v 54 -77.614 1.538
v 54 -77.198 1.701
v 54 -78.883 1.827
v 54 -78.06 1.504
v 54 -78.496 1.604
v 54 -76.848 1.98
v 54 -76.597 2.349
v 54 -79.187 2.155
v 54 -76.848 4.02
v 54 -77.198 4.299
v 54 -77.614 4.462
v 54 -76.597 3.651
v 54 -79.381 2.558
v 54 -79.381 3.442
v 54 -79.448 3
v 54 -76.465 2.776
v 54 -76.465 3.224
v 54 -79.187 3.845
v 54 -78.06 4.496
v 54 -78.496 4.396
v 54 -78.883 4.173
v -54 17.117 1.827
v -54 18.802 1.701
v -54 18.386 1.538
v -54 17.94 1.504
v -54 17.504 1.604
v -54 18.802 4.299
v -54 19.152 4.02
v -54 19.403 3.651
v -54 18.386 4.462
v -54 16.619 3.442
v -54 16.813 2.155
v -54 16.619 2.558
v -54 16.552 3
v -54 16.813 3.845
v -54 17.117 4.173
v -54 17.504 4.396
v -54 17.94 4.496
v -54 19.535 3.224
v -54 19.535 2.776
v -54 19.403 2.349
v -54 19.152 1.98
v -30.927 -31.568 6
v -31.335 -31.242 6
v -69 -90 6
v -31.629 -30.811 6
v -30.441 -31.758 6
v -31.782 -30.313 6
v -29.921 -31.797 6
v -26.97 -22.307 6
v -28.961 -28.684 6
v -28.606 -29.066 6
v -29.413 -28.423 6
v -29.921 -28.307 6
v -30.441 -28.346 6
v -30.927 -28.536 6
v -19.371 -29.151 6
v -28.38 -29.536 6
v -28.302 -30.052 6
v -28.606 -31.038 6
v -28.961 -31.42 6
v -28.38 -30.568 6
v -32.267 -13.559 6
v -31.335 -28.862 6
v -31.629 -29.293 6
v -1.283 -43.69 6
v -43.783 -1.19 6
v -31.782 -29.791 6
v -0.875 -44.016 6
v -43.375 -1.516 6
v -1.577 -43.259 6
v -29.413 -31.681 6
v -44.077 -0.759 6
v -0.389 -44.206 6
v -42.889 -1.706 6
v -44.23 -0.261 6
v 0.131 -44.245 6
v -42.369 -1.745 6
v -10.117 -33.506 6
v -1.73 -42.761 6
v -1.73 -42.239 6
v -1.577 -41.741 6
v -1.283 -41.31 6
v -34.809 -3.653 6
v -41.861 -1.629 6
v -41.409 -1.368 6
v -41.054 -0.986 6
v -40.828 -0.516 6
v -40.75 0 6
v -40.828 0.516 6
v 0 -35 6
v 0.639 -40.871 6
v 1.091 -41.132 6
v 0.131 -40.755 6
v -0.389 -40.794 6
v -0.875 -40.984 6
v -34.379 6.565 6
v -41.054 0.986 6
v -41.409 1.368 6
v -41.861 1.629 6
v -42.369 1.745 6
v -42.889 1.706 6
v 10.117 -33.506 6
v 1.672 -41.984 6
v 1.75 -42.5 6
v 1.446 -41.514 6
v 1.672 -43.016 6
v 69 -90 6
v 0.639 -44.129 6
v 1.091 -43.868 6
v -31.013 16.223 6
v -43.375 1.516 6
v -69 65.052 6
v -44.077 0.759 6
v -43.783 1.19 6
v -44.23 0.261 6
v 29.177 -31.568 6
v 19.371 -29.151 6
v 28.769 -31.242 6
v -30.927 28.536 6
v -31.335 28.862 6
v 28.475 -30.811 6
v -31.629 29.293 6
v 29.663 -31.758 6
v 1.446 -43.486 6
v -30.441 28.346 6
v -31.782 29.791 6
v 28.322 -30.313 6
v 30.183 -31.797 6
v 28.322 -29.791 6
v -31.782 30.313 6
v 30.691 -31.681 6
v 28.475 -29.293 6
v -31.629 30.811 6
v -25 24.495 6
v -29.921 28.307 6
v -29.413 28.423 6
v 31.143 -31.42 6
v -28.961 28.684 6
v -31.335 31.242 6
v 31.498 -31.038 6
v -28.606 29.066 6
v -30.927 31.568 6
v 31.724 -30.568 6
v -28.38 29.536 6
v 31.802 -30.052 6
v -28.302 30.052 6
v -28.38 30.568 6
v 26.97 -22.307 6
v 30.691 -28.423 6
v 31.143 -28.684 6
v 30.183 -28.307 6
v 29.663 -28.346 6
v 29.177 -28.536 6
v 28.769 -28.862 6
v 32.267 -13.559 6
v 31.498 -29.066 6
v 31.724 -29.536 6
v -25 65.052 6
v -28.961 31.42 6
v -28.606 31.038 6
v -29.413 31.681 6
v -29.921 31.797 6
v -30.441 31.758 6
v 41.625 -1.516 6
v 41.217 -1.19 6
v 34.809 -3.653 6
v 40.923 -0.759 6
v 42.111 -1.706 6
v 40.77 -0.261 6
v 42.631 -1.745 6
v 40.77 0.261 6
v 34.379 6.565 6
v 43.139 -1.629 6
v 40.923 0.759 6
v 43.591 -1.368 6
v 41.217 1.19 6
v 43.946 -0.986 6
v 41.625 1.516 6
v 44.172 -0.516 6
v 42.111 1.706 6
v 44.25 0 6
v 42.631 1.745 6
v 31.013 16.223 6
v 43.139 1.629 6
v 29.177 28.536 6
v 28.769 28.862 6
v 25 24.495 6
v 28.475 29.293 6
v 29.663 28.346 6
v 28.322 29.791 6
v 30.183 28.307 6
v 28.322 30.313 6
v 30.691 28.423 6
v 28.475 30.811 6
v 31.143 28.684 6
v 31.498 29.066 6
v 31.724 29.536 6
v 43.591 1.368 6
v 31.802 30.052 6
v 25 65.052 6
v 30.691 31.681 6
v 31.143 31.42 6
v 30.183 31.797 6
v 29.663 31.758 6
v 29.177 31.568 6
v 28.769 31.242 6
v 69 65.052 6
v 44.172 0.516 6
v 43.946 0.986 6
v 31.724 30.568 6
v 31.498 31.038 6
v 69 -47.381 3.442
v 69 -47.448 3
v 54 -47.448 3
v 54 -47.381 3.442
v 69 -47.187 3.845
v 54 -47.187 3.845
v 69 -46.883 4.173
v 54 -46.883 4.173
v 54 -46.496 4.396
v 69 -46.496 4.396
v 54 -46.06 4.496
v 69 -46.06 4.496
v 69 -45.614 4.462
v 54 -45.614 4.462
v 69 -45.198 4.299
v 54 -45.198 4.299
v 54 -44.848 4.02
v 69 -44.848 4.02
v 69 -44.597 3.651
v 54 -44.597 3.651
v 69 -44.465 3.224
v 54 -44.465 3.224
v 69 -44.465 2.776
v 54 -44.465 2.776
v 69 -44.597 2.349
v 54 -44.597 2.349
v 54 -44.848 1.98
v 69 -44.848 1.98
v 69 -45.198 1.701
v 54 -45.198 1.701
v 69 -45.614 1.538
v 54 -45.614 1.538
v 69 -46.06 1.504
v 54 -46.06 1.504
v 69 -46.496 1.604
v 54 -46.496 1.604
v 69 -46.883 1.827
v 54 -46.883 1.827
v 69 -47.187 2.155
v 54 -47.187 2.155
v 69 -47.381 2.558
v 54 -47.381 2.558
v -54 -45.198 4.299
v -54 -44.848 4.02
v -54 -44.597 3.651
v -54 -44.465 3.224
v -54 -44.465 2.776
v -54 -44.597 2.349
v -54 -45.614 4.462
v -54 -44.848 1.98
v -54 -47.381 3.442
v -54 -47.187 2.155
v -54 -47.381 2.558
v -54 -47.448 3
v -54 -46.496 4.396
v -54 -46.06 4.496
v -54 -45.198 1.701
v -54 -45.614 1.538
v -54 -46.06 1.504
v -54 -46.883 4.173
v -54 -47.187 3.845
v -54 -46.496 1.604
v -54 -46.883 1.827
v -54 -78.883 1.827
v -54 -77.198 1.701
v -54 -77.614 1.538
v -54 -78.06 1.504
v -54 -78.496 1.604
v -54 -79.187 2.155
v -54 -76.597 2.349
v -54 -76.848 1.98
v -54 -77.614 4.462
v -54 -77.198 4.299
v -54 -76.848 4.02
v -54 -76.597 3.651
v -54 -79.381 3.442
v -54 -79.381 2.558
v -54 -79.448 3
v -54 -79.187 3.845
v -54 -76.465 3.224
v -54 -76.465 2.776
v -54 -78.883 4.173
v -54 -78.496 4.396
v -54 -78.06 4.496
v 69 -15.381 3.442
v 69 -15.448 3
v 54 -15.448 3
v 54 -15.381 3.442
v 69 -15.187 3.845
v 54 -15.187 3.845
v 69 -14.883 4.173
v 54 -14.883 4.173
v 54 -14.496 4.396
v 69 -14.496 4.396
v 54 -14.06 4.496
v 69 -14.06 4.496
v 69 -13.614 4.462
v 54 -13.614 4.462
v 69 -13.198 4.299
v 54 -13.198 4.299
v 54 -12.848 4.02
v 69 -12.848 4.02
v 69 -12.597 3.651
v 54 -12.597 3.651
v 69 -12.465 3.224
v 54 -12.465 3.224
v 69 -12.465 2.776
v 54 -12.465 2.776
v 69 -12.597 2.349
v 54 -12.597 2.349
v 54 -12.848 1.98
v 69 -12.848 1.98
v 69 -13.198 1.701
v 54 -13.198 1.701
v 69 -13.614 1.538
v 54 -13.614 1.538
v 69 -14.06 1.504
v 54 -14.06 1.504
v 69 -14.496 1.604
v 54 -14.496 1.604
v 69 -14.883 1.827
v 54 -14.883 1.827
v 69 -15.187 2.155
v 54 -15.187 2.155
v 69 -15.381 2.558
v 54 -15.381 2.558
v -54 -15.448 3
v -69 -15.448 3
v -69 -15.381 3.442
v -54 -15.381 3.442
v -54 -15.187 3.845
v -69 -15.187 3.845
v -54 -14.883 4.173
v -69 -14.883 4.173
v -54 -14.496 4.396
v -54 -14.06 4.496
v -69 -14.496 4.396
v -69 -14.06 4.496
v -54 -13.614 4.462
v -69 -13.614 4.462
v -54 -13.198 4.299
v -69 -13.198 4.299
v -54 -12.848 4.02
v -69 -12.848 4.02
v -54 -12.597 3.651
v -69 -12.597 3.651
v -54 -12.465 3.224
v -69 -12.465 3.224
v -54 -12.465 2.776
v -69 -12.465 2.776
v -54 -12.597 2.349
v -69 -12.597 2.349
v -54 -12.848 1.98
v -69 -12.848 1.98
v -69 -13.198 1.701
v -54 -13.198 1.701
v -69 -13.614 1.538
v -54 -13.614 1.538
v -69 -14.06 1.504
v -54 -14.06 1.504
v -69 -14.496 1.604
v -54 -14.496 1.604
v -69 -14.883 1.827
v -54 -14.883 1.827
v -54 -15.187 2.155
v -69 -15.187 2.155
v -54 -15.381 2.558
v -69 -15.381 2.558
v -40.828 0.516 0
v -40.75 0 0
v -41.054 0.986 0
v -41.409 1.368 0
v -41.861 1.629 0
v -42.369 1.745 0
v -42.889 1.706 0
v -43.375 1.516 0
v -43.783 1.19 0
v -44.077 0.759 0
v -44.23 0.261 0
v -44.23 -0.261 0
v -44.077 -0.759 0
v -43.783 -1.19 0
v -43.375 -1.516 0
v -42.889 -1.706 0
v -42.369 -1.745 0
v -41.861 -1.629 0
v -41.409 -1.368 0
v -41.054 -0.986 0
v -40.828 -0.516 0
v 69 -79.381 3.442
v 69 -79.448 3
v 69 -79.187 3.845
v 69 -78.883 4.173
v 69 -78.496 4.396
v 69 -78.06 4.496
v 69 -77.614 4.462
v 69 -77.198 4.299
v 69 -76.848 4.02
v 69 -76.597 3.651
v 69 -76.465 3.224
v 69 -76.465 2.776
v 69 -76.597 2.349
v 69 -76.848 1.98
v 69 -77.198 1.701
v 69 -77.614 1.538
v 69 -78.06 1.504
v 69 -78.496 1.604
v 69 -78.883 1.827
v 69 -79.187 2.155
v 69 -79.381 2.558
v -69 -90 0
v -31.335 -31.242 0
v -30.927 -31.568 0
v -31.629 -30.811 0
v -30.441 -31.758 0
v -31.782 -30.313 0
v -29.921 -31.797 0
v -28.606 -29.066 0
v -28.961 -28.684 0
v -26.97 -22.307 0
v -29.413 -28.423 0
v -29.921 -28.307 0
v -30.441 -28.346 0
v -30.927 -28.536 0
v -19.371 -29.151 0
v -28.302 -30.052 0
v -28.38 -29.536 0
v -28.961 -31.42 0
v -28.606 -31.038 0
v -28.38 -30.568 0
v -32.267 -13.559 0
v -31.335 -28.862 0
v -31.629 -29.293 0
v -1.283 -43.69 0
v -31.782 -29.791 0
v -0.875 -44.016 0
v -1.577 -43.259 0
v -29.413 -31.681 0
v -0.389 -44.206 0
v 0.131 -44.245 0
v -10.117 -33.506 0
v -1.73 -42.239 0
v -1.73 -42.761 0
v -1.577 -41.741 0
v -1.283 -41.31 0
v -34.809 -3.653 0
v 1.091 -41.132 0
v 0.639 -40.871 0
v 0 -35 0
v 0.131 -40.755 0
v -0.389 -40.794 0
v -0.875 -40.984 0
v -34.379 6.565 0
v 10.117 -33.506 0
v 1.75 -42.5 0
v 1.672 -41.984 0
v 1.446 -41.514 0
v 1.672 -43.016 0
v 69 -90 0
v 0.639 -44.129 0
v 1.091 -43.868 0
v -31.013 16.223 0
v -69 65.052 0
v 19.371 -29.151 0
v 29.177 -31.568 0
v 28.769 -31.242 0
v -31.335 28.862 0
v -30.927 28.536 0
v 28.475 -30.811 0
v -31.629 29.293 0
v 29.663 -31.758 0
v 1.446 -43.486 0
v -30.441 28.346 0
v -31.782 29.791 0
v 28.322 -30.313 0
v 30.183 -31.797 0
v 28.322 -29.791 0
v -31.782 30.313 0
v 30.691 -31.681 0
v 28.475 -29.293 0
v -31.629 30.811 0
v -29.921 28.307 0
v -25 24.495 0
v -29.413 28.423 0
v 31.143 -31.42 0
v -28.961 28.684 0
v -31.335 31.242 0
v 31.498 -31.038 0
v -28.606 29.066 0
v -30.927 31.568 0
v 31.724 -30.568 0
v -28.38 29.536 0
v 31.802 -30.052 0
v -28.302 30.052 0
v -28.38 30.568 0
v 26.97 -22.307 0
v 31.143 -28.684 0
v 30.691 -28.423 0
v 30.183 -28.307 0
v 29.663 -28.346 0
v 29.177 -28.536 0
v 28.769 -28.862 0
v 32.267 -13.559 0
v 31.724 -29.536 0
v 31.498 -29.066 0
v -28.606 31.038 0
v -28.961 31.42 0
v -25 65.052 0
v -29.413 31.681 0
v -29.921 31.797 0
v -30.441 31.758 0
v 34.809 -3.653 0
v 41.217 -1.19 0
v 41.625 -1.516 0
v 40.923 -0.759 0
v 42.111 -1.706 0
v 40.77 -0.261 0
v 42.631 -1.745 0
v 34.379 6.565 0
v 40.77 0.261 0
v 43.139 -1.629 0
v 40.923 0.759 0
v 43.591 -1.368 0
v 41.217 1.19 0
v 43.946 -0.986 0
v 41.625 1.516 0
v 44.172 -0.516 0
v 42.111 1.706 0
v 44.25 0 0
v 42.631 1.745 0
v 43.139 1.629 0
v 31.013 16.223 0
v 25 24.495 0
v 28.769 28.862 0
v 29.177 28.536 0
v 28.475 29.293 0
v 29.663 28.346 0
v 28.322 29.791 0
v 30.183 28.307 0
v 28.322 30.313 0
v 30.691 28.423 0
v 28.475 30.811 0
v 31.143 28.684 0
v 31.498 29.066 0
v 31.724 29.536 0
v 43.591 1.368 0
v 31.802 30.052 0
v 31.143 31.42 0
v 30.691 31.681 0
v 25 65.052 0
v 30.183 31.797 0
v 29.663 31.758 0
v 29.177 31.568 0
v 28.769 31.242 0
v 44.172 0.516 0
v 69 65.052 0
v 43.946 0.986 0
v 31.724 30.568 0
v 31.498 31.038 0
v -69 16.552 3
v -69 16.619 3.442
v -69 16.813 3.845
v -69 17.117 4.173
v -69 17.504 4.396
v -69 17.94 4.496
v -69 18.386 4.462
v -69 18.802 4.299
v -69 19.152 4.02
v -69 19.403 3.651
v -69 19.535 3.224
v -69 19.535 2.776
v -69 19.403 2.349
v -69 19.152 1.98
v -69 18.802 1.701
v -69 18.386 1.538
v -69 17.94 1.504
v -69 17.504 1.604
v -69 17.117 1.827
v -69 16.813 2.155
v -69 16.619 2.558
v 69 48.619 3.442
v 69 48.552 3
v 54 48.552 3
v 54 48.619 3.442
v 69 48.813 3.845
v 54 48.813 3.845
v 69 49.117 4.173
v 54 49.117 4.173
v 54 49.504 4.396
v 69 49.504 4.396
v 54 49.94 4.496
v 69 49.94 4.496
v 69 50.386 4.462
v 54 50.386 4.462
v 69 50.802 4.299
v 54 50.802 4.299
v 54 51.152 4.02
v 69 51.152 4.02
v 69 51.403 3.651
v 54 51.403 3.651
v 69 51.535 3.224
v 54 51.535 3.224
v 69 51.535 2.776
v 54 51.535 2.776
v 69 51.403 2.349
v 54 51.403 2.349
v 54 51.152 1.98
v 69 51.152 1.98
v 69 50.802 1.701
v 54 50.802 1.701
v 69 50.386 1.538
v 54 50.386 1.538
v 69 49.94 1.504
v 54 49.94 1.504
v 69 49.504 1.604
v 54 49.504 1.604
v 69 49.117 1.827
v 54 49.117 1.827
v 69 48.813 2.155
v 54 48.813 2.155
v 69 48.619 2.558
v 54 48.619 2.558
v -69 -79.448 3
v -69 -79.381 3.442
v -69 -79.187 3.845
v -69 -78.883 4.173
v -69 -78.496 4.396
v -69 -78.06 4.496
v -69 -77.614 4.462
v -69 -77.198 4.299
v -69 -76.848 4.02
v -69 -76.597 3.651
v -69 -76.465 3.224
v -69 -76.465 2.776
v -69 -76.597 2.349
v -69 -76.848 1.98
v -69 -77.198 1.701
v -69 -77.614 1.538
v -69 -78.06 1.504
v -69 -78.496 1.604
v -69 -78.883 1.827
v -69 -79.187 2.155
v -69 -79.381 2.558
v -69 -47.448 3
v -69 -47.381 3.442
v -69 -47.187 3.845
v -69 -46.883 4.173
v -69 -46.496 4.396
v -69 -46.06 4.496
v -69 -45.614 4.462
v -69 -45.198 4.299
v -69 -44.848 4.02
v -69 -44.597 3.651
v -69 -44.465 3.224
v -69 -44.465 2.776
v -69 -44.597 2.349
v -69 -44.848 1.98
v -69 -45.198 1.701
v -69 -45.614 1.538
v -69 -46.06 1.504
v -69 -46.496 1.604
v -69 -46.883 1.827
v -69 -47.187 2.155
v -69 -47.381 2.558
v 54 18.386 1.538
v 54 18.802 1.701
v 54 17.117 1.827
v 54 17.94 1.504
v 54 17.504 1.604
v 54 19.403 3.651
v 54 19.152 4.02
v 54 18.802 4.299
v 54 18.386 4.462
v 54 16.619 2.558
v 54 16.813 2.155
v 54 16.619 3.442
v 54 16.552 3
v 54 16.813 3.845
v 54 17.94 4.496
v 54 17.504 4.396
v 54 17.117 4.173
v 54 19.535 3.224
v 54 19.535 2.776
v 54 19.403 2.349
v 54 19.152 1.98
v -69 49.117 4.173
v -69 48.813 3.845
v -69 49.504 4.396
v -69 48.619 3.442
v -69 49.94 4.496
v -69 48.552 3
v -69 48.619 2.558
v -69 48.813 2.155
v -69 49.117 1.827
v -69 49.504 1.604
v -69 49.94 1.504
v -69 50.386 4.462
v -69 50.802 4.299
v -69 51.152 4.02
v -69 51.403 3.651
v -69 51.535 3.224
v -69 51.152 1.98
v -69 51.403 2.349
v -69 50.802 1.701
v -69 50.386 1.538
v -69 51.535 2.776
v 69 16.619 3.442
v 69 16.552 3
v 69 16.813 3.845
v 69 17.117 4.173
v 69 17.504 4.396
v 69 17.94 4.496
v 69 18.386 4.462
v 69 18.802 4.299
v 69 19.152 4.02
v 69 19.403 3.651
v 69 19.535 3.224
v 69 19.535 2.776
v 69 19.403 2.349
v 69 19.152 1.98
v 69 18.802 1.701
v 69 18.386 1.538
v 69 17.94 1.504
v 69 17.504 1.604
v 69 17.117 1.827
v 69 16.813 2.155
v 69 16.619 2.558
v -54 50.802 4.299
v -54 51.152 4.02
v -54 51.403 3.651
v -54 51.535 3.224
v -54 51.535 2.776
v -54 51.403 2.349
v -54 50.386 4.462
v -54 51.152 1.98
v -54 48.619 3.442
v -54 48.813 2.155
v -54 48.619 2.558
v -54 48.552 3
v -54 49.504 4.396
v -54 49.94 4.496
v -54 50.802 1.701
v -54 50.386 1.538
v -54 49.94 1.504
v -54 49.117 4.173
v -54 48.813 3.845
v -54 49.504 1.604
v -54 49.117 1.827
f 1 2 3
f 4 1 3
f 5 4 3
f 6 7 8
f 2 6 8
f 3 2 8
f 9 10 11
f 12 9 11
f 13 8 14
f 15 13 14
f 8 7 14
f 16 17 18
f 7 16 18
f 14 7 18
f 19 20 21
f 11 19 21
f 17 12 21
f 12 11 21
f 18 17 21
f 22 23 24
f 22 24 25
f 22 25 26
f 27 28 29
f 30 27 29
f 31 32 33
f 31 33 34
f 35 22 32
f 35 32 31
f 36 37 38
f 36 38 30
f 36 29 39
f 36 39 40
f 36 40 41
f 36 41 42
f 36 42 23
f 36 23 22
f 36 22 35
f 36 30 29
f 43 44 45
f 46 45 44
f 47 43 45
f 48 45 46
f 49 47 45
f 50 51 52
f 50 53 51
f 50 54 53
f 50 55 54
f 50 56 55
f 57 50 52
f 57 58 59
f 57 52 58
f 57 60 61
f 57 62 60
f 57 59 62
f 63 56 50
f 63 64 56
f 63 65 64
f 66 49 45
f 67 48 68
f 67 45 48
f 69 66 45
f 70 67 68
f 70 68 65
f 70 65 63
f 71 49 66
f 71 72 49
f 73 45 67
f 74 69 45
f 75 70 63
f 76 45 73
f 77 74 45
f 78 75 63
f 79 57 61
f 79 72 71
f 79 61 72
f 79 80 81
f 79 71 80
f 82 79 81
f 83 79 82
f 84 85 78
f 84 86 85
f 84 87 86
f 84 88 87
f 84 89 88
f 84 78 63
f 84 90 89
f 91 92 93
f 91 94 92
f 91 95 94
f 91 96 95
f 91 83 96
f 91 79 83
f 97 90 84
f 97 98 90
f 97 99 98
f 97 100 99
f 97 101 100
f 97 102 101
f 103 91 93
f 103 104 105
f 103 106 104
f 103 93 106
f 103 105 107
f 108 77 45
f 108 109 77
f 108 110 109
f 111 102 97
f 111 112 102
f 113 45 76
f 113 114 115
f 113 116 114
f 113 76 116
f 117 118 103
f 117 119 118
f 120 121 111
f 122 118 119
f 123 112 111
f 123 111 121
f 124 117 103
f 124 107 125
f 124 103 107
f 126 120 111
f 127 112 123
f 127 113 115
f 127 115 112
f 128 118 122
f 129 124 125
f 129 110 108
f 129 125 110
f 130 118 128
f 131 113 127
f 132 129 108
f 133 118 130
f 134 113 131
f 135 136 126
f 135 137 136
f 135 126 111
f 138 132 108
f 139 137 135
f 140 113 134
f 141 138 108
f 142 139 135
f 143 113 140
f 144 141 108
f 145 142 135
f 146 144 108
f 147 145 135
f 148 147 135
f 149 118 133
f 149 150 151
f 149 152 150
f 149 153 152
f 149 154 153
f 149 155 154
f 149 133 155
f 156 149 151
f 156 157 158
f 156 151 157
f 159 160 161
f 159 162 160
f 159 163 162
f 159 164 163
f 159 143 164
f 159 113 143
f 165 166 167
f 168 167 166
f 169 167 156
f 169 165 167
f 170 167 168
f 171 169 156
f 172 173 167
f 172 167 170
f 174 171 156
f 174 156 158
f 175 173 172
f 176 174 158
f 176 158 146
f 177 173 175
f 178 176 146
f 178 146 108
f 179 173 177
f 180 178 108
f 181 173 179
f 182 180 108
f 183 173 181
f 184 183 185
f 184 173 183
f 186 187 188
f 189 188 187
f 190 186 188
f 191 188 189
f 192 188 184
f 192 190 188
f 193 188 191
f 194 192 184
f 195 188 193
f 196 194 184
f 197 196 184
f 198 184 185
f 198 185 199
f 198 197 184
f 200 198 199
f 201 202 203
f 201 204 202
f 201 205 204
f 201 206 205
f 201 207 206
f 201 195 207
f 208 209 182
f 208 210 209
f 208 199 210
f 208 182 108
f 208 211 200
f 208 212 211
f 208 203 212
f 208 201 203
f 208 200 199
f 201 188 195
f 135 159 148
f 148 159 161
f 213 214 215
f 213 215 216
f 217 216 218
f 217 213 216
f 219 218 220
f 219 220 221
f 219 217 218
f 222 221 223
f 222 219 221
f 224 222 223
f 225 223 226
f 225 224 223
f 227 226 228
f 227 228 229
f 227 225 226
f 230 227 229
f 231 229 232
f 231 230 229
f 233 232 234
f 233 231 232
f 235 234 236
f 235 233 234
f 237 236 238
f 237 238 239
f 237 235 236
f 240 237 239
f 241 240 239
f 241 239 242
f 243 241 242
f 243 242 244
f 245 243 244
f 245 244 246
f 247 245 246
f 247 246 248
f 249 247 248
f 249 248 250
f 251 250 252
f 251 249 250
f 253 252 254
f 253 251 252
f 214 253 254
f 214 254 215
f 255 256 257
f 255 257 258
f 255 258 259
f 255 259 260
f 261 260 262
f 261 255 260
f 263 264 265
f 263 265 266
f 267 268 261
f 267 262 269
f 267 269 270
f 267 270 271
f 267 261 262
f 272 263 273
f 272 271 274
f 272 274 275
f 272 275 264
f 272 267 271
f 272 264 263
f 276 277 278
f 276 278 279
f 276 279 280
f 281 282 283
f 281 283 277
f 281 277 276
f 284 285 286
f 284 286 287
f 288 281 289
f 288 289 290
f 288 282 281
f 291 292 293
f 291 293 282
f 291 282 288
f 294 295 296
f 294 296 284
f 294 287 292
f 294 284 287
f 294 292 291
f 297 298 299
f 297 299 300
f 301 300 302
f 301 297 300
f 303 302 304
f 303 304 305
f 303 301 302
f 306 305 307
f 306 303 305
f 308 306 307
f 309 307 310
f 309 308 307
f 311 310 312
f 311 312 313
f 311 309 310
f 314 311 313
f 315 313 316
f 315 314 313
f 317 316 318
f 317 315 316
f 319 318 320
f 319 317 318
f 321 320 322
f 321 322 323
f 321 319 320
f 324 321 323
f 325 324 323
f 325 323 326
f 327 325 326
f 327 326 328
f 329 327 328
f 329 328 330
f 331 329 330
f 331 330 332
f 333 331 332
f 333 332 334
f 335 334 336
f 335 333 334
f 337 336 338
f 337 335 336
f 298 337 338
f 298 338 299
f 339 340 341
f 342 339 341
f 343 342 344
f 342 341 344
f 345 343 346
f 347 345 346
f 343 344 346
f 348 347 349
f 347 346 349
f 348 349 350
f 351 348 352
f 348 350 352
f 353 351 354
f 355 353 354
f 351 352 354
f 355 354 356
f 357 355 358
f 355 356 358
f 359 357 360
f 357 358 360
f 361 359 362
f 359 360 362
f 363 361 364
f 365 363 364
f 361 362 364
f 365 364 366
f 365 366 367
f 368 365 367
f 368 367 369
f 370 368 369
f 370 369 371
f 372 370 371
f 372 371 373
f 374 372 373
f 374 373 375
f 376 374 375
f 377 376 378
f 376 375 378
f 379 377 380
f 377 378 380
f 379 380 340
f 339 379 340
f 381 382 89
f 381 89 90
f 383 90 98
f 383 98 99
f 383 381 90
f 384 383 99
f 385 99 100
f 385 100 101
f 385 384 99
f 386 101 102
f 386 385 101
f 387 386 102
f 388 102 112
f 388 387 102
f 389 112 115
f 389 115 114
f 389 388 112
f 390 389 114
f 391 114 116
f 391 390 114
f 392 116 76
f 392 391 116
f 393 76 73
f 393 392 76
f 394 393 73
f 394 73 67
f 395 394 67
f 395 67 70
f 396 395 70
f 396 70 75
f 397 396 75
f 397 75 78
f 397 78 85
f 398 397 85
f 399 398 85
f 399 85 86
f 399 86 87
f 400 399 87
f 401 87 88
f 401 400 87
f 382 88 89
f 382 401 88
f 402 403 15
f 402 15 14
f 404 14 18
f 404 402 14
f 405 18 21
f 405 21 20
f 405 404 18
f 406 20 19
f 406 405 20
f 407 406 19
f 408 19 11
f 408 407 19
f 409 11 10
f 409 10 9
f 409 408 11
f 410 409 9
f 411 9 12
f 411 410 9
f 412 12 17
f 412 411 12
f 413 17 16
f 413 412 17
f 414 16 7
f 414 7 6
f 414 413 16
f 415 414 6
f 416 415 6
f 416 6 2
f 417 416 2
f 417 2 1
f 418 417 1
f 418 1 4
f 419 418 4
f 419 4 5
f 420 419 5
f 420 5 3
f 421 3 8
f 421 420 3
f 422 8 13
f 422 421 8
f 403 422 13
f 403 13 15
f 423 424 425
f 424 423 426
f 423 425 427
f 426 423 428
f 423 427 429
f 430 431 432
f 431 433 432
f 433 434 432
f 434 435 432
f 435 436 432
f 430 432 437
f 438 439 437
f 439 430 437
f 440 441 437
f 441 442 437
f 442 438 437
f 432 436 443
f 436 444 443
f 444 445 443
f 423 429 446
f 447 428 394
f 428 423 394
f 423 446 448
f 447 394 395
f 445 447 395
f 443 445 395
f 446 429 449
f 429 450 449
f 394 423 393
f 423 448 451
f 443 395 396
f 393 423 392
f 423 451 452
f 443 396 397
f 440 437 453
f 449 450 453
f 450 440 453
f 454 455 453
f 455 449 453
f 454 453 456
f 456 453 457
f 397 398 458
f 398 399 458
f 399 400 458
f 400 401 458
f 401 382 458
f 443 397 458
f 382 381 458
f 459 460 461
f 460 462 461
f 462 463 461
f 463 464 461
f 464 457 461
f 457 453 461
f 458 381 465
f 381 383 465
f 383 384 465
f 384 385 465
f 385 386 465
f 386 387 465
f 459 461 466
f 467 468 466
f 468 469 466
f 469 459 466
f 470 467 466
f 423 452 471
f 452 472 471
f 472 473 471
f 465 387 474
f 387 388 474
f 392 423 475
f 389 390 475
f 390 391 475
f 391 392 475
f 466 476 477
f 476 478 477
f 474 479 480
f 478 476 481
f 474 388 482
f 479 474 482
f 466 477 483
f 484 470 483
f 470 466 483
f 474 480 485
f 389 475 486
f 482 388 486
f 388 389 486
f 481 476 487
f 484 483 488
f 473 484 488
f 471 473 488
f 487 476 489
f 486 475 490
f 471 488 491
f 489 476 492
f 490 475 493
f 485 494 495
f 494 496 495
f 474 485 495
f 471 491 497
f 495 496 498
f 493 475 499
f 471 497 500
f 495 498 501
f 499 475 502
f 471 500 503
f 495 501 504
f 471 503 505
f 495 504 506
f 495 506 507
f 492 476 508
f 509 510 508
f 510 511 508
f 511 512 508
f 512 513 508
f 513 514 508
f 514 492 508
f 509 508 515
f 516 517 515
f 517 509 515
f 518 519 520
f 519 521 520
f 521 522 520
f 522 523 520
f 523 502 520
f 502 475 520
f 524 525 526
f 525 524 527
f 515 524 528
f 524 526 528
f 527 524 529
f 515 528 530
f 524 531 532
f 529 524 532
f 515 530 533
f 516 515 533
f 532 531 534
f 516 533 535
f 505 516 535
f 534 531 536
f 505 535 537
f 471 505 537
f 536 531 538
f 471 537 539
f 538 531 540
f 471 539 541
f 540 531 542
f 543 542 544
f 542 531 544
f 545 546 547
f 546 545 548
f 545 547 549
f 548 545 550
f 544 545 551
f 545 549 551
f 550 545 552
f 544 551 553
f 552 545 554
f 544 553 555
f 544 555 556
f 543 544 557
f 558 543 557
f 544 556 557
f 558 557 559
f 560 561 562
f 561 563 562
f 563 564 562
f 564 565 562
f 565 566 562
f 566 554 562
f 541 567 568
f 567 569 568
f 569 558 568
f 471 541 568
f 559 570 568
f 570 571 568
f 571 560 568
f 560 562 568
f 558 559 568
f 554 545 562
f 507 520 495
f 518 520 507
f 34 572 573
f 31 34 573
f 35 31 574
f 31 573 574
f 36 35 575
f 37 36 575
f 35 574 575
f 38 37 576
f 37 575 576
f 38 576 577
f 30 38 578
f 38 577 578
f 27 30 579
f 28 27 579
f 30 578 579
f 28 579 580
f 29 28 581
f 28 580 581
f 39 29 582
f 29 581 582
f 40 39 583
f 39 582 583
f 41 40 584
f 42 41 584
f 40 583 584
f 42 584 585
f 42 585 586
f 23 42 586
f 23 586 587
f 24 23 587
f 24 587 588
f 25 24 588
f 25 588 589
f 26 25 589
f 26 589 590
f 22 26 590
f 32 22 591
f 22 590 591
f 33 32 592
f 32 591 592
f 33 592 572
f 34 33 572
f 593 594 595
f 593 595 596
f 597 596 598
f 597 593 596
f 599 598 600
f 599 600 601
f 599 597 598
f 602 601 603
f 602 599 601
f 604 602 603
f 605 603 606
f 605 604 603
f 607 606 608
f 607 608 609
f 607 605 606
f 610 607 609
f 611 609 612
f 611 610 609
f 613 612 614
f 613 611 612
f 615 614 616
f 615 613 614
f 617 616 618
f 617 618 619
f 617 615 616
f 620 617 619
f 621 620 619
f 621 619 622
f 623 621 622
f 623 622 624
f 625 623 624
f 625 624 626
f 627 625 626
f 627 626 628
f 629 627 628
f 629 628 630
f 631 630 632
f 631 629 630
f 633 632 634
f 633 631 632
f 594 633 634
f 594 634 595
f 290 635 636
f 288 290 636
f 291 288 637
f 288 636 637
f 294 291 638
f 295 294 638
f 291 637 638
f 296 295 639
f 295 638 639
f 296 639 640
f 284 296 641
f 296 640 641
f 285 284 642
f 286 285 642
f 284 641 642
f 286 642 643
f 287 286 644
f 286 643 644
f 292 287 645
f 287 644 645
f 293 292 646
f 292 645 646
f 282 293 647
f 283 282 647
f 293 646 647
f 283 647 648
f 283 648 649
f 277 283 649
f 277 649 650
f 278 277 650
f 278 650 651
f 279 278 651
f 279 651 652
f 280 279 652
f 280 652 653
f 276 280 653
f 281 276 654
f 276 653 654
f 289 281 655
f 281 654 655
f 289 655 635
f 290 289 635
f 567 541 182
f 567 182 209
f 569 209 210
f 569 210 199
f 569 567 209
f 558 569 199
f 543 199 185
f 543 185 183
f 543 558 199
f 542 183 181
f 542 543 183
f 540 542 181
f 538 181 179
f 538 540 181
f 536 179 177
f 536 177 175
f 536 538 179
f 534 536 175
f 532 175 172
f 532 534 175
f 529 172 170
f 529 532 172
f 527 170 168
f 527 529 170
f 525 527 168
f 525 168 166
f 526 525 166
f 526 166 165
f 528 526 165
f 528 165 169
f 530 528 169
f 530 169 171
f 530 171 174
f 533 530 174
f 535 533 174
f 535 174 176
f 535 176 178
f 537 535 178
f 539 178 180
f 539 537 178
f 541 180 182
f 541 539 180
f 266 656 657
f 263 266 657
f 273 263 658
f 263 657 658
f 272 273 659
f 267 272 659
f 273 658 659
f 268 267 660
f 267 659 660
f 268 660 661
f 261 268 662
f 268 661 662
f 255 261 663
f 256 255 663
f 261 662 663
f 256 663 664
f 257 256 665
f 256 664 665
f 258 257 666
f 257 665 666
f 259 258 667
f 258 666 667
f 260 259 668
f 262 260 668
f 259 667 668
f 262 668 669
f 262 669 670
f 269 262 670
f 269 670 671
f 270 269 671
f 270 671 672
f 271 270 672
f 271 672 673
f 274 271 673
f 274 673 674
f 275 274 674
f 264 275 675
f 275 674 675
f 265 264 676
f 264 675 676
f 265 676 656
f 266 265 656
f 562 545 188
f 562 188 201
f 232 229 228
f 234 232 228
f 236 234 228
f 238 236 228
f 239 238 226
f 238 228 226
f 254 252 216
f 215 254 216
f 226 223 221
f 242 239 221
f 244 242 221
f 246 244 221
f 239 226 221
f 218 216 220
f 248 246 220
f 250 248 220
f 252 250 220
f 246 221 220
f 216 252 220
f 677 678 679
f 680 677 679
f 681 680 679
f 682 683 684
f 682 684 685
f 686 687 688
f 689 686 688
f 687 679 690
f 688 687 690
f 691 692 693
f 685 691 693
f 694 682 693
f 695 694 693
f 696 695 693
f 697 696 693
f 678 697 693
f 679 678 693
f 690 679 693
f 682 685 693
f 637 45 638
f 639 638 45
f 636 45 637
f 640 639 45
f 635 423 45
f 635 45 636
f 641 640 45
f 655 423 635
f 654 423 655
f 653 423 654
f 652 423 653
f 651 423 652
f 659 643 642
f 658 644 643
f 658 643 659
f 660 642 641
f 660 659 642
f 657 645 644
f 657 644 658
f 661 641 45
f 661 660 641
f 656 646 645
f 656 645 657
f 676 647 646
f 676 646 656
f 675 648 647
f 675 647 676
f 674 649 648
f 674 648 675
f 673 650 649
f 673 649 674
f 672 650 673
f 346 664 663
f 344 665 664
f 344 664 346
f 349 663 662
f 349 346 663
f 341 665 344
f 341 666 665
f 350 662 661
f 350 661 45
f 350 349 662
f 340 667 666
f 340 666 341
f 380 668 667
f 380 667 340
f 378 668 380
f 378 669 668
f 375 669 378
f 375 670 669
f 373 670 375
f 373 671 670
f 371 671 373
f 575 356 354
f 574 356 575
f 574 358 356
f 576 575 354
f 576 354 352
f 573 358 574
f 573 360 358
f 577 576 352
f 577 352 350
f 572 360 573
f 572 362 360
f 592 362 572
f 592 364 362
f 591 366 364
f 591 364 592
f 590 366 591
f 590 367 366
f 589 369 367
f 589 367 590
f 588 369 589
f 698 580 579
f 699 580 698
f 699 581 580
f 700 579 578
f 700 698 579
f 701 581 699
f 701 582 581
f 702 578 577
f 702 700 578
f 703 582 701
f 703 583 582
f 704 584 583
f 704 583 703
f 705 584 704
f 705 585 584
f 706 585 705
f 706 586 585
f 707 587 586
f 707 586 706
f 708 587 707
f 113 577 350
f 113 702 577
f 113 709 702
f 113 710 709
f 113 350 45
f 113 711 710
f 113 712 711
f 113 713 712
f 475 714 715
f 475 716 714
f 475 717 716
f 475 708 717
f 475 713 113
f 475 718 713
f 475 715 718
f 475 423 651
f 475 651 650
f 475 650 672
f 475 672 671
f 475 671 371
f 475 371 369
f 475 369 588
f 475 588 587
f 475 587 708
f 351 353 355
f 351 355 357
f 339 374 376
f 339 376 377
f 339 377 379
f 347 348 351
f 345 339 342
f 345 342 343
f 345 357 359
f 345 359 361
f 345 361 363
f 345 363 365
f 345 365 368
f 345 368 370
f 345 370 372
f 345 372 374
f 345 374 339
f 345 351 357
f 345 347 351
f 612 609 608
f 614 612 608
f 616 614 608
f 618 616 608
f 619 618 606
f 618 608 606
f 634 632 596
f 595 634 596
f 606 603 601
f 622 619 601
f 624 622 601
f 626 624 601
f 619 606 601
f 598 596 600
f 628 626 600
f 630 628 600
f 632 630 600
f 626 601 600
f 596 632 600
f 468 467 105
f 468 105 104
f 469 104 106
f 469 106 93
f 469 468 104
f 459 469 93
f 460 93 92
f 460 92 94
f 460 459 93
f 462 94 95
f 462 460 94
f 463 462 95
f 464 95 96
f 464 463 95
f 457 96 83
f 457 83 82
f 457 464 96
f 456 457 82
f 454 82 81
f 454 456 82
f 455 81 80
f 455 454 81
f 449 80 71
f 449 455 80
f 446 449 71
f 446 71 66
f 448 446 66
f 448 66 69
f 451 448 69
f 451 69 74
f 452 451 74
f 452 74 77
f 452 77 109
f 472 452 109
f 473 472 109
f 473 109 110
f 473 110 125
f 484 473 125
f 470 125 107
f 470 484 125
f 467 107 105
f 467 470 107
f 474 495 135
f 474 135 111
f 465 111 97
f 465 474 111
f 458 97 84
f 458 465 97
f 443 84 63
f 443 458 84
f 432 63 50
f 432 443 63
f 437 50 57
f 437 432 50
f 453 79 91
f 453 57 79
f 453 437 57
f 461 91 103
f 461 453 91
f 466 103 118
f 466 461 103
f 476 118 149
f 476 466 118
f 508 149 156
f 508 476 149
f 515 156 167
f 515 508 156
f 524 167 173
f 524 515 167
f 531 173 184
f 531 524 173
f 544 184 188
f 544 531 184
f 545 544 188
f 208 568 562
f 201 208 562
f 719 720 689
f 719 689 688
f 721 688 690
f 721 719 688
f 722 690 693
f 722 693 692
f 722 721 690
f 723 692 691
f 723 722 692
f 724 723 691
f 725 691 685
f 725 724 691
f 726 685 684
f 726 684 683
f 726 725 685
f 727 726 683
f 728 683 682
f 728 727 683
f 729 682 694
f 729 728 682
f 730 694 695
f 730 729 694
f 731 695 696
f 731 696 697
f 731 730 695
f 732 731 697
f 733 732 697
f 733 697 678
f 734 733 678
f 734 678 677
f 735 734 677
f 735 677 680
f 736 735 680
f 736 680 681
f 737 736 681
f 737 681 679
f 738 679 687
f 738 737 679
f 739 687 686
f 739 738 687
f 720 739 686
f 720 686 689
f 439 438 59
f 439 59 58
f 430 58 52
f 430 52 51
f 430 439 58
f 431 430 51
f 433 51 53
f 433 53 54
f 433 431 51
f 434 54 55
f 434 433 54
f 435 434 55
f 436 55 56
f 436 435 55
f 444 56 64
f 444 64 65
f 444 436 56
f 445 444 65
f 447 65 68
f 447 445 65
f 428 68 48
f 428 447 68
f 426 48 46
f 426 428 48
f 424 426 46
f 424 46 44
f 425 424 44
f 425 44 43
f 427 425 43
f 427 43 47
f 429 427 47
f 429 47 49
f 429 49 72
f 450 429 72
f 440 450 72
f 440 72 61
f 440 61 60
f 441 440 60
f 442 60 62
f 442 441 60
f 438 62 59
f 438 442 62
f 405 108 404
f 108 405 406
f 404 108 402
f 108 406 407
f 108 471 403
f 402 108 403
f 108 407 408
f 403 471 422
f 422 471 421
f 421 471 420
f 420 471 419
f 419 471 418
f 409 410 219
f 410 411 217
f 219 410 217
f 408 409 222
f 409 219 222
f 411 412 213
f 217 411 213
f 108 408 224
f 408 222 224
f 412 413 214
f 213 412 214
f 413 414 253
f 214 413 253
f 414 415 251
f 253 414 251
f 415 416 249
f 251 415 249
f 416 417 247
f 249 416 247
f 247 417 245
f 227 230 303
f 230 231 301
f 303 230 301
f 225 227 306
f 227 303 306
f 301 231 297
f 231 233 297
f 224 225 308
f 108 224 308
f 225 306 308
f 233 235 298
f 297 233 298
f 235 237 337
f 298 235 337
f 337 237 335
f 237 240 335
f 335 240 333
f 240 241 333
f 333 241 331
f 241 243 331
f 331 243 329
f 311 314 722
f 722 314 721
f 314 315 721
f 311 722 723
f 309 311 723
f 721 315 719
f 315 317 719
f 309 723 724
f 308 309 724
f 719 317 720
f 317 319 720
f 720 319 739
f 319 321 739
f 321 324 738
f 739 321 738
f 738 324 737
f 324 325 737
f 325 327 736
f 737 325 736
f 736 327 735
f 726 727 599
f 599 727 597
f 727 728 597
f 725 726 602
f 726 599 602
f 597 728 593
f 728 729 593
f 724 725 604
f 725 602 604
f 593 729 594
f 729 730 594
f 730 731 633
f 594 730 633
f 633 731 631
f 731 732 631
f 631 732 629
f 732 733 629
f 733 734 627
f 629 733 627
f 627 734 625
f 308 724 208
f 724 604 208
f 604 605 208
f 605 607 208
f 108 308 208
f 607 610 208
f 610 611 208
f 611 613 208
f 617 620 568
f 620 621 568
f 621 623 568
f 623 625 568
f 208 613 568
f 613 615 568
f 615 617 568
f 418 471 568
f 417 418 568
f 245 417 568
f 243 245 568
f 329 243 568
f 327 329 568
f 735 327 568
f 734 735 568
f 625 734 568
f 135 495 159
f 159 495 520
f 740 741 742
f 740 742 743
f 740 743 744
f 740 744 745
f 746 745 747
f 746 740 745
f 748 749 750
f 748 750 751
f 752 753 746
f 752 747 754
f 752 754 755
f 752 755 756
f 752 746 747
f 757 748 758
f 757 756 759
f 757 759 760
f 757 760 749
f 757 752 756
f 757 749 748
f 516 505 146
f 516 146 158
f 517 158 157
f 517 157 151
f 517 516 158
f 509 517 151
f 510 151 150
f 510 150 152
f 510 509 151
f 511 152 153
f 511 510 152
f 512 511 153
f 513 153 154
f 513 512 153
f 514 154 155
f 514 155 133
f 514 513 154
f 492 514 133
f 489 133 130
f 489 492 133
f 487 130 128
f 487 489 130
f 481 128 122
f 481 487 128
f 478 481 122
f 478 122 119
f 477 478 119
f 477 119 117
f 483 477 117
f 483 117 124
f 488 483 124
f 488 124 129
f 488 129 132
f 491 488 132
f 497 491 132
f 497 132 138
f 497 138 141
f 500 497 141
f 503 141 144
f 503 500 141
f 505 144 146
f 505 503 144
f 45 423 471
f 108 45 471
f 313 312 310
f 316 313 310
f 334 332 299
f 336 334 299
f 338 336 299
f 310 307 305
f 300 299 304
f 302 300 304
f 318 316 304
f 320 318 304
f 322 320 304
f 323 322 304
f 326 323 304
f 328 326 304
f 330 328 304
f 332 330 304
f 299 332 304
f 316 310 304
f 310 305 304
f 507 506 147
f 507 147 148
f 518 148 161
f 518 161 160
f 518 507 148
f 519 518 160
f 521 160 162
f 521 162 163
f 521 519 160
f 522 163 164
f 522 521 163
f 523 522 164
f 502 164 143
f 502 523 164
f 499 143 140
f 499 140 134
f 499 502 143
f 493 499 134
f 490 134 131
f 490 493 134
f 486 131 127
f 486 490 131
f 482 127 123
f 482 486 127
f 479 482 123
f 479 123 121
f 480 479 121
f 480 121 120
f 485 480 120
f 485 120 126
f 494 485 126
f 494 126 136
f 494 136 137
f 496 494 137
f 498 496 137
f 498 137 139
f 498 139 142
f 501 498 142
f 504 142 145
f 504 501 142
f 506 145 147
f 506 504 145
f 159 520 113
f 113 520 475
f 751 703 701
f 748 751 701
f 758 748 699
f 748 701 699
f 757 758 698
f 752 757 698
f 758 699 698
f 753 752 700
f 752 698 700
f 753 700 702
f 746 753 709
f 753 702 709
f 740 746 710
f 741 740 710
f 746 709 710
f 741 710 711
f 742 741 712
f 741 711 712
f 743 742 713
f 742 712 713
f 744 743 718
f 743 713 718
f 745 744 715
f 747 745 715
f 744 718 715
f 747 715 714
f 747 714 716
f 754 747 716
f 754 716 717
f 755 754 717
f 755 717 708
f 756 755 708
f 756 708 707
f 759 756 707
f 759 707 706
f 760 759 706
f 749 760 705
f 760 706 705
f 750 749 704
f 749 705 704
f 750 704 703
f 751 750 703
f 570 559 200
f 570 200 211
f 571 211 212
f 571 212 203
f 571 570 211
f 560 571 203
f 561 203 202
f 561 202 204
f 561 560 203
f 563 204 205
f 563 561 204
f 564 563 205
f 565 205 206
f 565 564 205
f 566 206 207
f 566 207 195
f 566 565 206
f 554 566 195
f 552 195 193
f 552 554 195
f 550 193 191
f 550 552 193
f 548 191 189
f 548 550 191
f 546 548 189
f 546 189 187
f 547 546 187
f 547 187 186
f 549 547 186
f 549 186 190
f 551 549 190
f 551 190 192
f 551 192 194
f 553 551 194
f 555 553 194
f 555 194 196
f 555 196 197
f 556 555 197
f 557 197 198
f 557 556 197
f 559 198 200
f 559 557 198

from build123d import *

# Parameters (mm, degrees)
SKETCH_1_W          = 138
SKETCH_1_H          = 180
SKETCH_1_R          = 1.75
SKETCH_1_R_2        = 35
EXTRUDE_1_DEPTH     = 6
SKETCH_2_W          = 50
SKETCH_2_H          = 50
CUT_EXTRUDE_1_DEPTH = 10
SKETCH_4_W          = 185.340515344
SKETCH_4_H          = 73.1161564
CUT_EXTRUDE_3_DEPTH = 10
SKETCH_3_R          = 1.5
CUT_EXTRUDE_2_DEPTH = 15


with BuildPart() as part:
    # 草图1 → 凸台-拉伸1 (new body)
    with BuildSketch(Plane.XY):
        Rectangle(SKETCH_1_W, SKETCH_1_H)
        with Locations((0, 42.5)):
            Circle(SKETCH_1_R, mode=Mode.SUBTRACT)
        with Locations((30.0520382, 30.0520382)):
            Circle(SKETCH_1_R, mode=Mode.SUBTRACT)
        with Locations((42.5, 0)):
            Circle(SKETCH_1_R, mode=Mode.SUBTRACT)
        with Locations((30.0520382, -30.0520382)):
            Circle(SKETCH_1_R, mode=Mode.SUBTRACT)
        with Locations((0, -42.5)):
            Circle(SKETCH_1_R, mode=Mode.SUBTRACT)
        with Locations((-30.0520382, -30.0520382)):
            Circle(SKETCH_1_R, mode=Mode.SUBTRACT)
        with Locations((-42.5, 0)):
            Circle(SKETCH_1_R, mode=Mode.SUBTRACT)
        with Locations((-30.0520382, 30.0520382)):
            Circle(SKETCH_1_R, mode=Mode.SUBTRACT)
        Circle(SKETCH_1_R_2, mode=Mode.SUBTRACT)
    extrude(amount=EXTRUDE_1_DEPTH)

    # 草图2 → 切除-拉伸1 (cut)
    with BuildSketch(Plane(origin=(0, 0, 0), x_dir=(-1, 0, 0), z_dir=(0, 0, -1))):
        with Locations((0, 45)):
            Rectangle(SKETCH_2_W, SKETCH_2_H)
    extrude(amount=-CUT_EXTRUDE_1_DEPTH, mode=Mode.SUBTRACT)

    # 草图4 → 切除-拉伸3 (cut)
    with BuildSketch(Plane(origin=(0, 0, 0), x_dir=(-1, 0, 0), z_dir=(0, 0, -1))):
        with Locations((5.331713455, 101.6101164)):
            Rectangle(SKETCH_4_W, SKETCH_4_H)
    extrude(amount=-CUT_EXTRUDE_3_DEPTH, mode=Mode.SUBTRACT)

    # 草图3 → 切除-拉伸2 (cut)
    with BuildSketch(Plane.ZY.offset(69)):
        with Locations(Location((3, 50.0520382, 0), (0, 0, 270))):
            Circle(SKETCH_3_R)
        with Locations(Location((3, 18.0520382, 0), (0, 0, 270))):
            Circle(SKETCH_3_R)
        with Locations(Location((3, -13.9479618, 0), (0, 0, 270))):
            Circle(SKETCH_3_R)
        with Locations(Location((3, -45.9479618, 0), (0, 0, 270))):
            Circle(SKETCH_3_R)
        with Locations(Location((3, -77.9479618, 0), (0, 0, 270))):
            Circle(SKETCH_3_R)
    cut_extrude_2 = extrude(amount=-CUT_EXTRUDE_2_DEPTH, mode=Mode.SUBTRACT)

    # 镜向1: 切除-拉伸2 across plane
    add(cut_extrude_2.mirror(Plane.ZY), mode=Mode.SUBTRACT)


solid = part.part
